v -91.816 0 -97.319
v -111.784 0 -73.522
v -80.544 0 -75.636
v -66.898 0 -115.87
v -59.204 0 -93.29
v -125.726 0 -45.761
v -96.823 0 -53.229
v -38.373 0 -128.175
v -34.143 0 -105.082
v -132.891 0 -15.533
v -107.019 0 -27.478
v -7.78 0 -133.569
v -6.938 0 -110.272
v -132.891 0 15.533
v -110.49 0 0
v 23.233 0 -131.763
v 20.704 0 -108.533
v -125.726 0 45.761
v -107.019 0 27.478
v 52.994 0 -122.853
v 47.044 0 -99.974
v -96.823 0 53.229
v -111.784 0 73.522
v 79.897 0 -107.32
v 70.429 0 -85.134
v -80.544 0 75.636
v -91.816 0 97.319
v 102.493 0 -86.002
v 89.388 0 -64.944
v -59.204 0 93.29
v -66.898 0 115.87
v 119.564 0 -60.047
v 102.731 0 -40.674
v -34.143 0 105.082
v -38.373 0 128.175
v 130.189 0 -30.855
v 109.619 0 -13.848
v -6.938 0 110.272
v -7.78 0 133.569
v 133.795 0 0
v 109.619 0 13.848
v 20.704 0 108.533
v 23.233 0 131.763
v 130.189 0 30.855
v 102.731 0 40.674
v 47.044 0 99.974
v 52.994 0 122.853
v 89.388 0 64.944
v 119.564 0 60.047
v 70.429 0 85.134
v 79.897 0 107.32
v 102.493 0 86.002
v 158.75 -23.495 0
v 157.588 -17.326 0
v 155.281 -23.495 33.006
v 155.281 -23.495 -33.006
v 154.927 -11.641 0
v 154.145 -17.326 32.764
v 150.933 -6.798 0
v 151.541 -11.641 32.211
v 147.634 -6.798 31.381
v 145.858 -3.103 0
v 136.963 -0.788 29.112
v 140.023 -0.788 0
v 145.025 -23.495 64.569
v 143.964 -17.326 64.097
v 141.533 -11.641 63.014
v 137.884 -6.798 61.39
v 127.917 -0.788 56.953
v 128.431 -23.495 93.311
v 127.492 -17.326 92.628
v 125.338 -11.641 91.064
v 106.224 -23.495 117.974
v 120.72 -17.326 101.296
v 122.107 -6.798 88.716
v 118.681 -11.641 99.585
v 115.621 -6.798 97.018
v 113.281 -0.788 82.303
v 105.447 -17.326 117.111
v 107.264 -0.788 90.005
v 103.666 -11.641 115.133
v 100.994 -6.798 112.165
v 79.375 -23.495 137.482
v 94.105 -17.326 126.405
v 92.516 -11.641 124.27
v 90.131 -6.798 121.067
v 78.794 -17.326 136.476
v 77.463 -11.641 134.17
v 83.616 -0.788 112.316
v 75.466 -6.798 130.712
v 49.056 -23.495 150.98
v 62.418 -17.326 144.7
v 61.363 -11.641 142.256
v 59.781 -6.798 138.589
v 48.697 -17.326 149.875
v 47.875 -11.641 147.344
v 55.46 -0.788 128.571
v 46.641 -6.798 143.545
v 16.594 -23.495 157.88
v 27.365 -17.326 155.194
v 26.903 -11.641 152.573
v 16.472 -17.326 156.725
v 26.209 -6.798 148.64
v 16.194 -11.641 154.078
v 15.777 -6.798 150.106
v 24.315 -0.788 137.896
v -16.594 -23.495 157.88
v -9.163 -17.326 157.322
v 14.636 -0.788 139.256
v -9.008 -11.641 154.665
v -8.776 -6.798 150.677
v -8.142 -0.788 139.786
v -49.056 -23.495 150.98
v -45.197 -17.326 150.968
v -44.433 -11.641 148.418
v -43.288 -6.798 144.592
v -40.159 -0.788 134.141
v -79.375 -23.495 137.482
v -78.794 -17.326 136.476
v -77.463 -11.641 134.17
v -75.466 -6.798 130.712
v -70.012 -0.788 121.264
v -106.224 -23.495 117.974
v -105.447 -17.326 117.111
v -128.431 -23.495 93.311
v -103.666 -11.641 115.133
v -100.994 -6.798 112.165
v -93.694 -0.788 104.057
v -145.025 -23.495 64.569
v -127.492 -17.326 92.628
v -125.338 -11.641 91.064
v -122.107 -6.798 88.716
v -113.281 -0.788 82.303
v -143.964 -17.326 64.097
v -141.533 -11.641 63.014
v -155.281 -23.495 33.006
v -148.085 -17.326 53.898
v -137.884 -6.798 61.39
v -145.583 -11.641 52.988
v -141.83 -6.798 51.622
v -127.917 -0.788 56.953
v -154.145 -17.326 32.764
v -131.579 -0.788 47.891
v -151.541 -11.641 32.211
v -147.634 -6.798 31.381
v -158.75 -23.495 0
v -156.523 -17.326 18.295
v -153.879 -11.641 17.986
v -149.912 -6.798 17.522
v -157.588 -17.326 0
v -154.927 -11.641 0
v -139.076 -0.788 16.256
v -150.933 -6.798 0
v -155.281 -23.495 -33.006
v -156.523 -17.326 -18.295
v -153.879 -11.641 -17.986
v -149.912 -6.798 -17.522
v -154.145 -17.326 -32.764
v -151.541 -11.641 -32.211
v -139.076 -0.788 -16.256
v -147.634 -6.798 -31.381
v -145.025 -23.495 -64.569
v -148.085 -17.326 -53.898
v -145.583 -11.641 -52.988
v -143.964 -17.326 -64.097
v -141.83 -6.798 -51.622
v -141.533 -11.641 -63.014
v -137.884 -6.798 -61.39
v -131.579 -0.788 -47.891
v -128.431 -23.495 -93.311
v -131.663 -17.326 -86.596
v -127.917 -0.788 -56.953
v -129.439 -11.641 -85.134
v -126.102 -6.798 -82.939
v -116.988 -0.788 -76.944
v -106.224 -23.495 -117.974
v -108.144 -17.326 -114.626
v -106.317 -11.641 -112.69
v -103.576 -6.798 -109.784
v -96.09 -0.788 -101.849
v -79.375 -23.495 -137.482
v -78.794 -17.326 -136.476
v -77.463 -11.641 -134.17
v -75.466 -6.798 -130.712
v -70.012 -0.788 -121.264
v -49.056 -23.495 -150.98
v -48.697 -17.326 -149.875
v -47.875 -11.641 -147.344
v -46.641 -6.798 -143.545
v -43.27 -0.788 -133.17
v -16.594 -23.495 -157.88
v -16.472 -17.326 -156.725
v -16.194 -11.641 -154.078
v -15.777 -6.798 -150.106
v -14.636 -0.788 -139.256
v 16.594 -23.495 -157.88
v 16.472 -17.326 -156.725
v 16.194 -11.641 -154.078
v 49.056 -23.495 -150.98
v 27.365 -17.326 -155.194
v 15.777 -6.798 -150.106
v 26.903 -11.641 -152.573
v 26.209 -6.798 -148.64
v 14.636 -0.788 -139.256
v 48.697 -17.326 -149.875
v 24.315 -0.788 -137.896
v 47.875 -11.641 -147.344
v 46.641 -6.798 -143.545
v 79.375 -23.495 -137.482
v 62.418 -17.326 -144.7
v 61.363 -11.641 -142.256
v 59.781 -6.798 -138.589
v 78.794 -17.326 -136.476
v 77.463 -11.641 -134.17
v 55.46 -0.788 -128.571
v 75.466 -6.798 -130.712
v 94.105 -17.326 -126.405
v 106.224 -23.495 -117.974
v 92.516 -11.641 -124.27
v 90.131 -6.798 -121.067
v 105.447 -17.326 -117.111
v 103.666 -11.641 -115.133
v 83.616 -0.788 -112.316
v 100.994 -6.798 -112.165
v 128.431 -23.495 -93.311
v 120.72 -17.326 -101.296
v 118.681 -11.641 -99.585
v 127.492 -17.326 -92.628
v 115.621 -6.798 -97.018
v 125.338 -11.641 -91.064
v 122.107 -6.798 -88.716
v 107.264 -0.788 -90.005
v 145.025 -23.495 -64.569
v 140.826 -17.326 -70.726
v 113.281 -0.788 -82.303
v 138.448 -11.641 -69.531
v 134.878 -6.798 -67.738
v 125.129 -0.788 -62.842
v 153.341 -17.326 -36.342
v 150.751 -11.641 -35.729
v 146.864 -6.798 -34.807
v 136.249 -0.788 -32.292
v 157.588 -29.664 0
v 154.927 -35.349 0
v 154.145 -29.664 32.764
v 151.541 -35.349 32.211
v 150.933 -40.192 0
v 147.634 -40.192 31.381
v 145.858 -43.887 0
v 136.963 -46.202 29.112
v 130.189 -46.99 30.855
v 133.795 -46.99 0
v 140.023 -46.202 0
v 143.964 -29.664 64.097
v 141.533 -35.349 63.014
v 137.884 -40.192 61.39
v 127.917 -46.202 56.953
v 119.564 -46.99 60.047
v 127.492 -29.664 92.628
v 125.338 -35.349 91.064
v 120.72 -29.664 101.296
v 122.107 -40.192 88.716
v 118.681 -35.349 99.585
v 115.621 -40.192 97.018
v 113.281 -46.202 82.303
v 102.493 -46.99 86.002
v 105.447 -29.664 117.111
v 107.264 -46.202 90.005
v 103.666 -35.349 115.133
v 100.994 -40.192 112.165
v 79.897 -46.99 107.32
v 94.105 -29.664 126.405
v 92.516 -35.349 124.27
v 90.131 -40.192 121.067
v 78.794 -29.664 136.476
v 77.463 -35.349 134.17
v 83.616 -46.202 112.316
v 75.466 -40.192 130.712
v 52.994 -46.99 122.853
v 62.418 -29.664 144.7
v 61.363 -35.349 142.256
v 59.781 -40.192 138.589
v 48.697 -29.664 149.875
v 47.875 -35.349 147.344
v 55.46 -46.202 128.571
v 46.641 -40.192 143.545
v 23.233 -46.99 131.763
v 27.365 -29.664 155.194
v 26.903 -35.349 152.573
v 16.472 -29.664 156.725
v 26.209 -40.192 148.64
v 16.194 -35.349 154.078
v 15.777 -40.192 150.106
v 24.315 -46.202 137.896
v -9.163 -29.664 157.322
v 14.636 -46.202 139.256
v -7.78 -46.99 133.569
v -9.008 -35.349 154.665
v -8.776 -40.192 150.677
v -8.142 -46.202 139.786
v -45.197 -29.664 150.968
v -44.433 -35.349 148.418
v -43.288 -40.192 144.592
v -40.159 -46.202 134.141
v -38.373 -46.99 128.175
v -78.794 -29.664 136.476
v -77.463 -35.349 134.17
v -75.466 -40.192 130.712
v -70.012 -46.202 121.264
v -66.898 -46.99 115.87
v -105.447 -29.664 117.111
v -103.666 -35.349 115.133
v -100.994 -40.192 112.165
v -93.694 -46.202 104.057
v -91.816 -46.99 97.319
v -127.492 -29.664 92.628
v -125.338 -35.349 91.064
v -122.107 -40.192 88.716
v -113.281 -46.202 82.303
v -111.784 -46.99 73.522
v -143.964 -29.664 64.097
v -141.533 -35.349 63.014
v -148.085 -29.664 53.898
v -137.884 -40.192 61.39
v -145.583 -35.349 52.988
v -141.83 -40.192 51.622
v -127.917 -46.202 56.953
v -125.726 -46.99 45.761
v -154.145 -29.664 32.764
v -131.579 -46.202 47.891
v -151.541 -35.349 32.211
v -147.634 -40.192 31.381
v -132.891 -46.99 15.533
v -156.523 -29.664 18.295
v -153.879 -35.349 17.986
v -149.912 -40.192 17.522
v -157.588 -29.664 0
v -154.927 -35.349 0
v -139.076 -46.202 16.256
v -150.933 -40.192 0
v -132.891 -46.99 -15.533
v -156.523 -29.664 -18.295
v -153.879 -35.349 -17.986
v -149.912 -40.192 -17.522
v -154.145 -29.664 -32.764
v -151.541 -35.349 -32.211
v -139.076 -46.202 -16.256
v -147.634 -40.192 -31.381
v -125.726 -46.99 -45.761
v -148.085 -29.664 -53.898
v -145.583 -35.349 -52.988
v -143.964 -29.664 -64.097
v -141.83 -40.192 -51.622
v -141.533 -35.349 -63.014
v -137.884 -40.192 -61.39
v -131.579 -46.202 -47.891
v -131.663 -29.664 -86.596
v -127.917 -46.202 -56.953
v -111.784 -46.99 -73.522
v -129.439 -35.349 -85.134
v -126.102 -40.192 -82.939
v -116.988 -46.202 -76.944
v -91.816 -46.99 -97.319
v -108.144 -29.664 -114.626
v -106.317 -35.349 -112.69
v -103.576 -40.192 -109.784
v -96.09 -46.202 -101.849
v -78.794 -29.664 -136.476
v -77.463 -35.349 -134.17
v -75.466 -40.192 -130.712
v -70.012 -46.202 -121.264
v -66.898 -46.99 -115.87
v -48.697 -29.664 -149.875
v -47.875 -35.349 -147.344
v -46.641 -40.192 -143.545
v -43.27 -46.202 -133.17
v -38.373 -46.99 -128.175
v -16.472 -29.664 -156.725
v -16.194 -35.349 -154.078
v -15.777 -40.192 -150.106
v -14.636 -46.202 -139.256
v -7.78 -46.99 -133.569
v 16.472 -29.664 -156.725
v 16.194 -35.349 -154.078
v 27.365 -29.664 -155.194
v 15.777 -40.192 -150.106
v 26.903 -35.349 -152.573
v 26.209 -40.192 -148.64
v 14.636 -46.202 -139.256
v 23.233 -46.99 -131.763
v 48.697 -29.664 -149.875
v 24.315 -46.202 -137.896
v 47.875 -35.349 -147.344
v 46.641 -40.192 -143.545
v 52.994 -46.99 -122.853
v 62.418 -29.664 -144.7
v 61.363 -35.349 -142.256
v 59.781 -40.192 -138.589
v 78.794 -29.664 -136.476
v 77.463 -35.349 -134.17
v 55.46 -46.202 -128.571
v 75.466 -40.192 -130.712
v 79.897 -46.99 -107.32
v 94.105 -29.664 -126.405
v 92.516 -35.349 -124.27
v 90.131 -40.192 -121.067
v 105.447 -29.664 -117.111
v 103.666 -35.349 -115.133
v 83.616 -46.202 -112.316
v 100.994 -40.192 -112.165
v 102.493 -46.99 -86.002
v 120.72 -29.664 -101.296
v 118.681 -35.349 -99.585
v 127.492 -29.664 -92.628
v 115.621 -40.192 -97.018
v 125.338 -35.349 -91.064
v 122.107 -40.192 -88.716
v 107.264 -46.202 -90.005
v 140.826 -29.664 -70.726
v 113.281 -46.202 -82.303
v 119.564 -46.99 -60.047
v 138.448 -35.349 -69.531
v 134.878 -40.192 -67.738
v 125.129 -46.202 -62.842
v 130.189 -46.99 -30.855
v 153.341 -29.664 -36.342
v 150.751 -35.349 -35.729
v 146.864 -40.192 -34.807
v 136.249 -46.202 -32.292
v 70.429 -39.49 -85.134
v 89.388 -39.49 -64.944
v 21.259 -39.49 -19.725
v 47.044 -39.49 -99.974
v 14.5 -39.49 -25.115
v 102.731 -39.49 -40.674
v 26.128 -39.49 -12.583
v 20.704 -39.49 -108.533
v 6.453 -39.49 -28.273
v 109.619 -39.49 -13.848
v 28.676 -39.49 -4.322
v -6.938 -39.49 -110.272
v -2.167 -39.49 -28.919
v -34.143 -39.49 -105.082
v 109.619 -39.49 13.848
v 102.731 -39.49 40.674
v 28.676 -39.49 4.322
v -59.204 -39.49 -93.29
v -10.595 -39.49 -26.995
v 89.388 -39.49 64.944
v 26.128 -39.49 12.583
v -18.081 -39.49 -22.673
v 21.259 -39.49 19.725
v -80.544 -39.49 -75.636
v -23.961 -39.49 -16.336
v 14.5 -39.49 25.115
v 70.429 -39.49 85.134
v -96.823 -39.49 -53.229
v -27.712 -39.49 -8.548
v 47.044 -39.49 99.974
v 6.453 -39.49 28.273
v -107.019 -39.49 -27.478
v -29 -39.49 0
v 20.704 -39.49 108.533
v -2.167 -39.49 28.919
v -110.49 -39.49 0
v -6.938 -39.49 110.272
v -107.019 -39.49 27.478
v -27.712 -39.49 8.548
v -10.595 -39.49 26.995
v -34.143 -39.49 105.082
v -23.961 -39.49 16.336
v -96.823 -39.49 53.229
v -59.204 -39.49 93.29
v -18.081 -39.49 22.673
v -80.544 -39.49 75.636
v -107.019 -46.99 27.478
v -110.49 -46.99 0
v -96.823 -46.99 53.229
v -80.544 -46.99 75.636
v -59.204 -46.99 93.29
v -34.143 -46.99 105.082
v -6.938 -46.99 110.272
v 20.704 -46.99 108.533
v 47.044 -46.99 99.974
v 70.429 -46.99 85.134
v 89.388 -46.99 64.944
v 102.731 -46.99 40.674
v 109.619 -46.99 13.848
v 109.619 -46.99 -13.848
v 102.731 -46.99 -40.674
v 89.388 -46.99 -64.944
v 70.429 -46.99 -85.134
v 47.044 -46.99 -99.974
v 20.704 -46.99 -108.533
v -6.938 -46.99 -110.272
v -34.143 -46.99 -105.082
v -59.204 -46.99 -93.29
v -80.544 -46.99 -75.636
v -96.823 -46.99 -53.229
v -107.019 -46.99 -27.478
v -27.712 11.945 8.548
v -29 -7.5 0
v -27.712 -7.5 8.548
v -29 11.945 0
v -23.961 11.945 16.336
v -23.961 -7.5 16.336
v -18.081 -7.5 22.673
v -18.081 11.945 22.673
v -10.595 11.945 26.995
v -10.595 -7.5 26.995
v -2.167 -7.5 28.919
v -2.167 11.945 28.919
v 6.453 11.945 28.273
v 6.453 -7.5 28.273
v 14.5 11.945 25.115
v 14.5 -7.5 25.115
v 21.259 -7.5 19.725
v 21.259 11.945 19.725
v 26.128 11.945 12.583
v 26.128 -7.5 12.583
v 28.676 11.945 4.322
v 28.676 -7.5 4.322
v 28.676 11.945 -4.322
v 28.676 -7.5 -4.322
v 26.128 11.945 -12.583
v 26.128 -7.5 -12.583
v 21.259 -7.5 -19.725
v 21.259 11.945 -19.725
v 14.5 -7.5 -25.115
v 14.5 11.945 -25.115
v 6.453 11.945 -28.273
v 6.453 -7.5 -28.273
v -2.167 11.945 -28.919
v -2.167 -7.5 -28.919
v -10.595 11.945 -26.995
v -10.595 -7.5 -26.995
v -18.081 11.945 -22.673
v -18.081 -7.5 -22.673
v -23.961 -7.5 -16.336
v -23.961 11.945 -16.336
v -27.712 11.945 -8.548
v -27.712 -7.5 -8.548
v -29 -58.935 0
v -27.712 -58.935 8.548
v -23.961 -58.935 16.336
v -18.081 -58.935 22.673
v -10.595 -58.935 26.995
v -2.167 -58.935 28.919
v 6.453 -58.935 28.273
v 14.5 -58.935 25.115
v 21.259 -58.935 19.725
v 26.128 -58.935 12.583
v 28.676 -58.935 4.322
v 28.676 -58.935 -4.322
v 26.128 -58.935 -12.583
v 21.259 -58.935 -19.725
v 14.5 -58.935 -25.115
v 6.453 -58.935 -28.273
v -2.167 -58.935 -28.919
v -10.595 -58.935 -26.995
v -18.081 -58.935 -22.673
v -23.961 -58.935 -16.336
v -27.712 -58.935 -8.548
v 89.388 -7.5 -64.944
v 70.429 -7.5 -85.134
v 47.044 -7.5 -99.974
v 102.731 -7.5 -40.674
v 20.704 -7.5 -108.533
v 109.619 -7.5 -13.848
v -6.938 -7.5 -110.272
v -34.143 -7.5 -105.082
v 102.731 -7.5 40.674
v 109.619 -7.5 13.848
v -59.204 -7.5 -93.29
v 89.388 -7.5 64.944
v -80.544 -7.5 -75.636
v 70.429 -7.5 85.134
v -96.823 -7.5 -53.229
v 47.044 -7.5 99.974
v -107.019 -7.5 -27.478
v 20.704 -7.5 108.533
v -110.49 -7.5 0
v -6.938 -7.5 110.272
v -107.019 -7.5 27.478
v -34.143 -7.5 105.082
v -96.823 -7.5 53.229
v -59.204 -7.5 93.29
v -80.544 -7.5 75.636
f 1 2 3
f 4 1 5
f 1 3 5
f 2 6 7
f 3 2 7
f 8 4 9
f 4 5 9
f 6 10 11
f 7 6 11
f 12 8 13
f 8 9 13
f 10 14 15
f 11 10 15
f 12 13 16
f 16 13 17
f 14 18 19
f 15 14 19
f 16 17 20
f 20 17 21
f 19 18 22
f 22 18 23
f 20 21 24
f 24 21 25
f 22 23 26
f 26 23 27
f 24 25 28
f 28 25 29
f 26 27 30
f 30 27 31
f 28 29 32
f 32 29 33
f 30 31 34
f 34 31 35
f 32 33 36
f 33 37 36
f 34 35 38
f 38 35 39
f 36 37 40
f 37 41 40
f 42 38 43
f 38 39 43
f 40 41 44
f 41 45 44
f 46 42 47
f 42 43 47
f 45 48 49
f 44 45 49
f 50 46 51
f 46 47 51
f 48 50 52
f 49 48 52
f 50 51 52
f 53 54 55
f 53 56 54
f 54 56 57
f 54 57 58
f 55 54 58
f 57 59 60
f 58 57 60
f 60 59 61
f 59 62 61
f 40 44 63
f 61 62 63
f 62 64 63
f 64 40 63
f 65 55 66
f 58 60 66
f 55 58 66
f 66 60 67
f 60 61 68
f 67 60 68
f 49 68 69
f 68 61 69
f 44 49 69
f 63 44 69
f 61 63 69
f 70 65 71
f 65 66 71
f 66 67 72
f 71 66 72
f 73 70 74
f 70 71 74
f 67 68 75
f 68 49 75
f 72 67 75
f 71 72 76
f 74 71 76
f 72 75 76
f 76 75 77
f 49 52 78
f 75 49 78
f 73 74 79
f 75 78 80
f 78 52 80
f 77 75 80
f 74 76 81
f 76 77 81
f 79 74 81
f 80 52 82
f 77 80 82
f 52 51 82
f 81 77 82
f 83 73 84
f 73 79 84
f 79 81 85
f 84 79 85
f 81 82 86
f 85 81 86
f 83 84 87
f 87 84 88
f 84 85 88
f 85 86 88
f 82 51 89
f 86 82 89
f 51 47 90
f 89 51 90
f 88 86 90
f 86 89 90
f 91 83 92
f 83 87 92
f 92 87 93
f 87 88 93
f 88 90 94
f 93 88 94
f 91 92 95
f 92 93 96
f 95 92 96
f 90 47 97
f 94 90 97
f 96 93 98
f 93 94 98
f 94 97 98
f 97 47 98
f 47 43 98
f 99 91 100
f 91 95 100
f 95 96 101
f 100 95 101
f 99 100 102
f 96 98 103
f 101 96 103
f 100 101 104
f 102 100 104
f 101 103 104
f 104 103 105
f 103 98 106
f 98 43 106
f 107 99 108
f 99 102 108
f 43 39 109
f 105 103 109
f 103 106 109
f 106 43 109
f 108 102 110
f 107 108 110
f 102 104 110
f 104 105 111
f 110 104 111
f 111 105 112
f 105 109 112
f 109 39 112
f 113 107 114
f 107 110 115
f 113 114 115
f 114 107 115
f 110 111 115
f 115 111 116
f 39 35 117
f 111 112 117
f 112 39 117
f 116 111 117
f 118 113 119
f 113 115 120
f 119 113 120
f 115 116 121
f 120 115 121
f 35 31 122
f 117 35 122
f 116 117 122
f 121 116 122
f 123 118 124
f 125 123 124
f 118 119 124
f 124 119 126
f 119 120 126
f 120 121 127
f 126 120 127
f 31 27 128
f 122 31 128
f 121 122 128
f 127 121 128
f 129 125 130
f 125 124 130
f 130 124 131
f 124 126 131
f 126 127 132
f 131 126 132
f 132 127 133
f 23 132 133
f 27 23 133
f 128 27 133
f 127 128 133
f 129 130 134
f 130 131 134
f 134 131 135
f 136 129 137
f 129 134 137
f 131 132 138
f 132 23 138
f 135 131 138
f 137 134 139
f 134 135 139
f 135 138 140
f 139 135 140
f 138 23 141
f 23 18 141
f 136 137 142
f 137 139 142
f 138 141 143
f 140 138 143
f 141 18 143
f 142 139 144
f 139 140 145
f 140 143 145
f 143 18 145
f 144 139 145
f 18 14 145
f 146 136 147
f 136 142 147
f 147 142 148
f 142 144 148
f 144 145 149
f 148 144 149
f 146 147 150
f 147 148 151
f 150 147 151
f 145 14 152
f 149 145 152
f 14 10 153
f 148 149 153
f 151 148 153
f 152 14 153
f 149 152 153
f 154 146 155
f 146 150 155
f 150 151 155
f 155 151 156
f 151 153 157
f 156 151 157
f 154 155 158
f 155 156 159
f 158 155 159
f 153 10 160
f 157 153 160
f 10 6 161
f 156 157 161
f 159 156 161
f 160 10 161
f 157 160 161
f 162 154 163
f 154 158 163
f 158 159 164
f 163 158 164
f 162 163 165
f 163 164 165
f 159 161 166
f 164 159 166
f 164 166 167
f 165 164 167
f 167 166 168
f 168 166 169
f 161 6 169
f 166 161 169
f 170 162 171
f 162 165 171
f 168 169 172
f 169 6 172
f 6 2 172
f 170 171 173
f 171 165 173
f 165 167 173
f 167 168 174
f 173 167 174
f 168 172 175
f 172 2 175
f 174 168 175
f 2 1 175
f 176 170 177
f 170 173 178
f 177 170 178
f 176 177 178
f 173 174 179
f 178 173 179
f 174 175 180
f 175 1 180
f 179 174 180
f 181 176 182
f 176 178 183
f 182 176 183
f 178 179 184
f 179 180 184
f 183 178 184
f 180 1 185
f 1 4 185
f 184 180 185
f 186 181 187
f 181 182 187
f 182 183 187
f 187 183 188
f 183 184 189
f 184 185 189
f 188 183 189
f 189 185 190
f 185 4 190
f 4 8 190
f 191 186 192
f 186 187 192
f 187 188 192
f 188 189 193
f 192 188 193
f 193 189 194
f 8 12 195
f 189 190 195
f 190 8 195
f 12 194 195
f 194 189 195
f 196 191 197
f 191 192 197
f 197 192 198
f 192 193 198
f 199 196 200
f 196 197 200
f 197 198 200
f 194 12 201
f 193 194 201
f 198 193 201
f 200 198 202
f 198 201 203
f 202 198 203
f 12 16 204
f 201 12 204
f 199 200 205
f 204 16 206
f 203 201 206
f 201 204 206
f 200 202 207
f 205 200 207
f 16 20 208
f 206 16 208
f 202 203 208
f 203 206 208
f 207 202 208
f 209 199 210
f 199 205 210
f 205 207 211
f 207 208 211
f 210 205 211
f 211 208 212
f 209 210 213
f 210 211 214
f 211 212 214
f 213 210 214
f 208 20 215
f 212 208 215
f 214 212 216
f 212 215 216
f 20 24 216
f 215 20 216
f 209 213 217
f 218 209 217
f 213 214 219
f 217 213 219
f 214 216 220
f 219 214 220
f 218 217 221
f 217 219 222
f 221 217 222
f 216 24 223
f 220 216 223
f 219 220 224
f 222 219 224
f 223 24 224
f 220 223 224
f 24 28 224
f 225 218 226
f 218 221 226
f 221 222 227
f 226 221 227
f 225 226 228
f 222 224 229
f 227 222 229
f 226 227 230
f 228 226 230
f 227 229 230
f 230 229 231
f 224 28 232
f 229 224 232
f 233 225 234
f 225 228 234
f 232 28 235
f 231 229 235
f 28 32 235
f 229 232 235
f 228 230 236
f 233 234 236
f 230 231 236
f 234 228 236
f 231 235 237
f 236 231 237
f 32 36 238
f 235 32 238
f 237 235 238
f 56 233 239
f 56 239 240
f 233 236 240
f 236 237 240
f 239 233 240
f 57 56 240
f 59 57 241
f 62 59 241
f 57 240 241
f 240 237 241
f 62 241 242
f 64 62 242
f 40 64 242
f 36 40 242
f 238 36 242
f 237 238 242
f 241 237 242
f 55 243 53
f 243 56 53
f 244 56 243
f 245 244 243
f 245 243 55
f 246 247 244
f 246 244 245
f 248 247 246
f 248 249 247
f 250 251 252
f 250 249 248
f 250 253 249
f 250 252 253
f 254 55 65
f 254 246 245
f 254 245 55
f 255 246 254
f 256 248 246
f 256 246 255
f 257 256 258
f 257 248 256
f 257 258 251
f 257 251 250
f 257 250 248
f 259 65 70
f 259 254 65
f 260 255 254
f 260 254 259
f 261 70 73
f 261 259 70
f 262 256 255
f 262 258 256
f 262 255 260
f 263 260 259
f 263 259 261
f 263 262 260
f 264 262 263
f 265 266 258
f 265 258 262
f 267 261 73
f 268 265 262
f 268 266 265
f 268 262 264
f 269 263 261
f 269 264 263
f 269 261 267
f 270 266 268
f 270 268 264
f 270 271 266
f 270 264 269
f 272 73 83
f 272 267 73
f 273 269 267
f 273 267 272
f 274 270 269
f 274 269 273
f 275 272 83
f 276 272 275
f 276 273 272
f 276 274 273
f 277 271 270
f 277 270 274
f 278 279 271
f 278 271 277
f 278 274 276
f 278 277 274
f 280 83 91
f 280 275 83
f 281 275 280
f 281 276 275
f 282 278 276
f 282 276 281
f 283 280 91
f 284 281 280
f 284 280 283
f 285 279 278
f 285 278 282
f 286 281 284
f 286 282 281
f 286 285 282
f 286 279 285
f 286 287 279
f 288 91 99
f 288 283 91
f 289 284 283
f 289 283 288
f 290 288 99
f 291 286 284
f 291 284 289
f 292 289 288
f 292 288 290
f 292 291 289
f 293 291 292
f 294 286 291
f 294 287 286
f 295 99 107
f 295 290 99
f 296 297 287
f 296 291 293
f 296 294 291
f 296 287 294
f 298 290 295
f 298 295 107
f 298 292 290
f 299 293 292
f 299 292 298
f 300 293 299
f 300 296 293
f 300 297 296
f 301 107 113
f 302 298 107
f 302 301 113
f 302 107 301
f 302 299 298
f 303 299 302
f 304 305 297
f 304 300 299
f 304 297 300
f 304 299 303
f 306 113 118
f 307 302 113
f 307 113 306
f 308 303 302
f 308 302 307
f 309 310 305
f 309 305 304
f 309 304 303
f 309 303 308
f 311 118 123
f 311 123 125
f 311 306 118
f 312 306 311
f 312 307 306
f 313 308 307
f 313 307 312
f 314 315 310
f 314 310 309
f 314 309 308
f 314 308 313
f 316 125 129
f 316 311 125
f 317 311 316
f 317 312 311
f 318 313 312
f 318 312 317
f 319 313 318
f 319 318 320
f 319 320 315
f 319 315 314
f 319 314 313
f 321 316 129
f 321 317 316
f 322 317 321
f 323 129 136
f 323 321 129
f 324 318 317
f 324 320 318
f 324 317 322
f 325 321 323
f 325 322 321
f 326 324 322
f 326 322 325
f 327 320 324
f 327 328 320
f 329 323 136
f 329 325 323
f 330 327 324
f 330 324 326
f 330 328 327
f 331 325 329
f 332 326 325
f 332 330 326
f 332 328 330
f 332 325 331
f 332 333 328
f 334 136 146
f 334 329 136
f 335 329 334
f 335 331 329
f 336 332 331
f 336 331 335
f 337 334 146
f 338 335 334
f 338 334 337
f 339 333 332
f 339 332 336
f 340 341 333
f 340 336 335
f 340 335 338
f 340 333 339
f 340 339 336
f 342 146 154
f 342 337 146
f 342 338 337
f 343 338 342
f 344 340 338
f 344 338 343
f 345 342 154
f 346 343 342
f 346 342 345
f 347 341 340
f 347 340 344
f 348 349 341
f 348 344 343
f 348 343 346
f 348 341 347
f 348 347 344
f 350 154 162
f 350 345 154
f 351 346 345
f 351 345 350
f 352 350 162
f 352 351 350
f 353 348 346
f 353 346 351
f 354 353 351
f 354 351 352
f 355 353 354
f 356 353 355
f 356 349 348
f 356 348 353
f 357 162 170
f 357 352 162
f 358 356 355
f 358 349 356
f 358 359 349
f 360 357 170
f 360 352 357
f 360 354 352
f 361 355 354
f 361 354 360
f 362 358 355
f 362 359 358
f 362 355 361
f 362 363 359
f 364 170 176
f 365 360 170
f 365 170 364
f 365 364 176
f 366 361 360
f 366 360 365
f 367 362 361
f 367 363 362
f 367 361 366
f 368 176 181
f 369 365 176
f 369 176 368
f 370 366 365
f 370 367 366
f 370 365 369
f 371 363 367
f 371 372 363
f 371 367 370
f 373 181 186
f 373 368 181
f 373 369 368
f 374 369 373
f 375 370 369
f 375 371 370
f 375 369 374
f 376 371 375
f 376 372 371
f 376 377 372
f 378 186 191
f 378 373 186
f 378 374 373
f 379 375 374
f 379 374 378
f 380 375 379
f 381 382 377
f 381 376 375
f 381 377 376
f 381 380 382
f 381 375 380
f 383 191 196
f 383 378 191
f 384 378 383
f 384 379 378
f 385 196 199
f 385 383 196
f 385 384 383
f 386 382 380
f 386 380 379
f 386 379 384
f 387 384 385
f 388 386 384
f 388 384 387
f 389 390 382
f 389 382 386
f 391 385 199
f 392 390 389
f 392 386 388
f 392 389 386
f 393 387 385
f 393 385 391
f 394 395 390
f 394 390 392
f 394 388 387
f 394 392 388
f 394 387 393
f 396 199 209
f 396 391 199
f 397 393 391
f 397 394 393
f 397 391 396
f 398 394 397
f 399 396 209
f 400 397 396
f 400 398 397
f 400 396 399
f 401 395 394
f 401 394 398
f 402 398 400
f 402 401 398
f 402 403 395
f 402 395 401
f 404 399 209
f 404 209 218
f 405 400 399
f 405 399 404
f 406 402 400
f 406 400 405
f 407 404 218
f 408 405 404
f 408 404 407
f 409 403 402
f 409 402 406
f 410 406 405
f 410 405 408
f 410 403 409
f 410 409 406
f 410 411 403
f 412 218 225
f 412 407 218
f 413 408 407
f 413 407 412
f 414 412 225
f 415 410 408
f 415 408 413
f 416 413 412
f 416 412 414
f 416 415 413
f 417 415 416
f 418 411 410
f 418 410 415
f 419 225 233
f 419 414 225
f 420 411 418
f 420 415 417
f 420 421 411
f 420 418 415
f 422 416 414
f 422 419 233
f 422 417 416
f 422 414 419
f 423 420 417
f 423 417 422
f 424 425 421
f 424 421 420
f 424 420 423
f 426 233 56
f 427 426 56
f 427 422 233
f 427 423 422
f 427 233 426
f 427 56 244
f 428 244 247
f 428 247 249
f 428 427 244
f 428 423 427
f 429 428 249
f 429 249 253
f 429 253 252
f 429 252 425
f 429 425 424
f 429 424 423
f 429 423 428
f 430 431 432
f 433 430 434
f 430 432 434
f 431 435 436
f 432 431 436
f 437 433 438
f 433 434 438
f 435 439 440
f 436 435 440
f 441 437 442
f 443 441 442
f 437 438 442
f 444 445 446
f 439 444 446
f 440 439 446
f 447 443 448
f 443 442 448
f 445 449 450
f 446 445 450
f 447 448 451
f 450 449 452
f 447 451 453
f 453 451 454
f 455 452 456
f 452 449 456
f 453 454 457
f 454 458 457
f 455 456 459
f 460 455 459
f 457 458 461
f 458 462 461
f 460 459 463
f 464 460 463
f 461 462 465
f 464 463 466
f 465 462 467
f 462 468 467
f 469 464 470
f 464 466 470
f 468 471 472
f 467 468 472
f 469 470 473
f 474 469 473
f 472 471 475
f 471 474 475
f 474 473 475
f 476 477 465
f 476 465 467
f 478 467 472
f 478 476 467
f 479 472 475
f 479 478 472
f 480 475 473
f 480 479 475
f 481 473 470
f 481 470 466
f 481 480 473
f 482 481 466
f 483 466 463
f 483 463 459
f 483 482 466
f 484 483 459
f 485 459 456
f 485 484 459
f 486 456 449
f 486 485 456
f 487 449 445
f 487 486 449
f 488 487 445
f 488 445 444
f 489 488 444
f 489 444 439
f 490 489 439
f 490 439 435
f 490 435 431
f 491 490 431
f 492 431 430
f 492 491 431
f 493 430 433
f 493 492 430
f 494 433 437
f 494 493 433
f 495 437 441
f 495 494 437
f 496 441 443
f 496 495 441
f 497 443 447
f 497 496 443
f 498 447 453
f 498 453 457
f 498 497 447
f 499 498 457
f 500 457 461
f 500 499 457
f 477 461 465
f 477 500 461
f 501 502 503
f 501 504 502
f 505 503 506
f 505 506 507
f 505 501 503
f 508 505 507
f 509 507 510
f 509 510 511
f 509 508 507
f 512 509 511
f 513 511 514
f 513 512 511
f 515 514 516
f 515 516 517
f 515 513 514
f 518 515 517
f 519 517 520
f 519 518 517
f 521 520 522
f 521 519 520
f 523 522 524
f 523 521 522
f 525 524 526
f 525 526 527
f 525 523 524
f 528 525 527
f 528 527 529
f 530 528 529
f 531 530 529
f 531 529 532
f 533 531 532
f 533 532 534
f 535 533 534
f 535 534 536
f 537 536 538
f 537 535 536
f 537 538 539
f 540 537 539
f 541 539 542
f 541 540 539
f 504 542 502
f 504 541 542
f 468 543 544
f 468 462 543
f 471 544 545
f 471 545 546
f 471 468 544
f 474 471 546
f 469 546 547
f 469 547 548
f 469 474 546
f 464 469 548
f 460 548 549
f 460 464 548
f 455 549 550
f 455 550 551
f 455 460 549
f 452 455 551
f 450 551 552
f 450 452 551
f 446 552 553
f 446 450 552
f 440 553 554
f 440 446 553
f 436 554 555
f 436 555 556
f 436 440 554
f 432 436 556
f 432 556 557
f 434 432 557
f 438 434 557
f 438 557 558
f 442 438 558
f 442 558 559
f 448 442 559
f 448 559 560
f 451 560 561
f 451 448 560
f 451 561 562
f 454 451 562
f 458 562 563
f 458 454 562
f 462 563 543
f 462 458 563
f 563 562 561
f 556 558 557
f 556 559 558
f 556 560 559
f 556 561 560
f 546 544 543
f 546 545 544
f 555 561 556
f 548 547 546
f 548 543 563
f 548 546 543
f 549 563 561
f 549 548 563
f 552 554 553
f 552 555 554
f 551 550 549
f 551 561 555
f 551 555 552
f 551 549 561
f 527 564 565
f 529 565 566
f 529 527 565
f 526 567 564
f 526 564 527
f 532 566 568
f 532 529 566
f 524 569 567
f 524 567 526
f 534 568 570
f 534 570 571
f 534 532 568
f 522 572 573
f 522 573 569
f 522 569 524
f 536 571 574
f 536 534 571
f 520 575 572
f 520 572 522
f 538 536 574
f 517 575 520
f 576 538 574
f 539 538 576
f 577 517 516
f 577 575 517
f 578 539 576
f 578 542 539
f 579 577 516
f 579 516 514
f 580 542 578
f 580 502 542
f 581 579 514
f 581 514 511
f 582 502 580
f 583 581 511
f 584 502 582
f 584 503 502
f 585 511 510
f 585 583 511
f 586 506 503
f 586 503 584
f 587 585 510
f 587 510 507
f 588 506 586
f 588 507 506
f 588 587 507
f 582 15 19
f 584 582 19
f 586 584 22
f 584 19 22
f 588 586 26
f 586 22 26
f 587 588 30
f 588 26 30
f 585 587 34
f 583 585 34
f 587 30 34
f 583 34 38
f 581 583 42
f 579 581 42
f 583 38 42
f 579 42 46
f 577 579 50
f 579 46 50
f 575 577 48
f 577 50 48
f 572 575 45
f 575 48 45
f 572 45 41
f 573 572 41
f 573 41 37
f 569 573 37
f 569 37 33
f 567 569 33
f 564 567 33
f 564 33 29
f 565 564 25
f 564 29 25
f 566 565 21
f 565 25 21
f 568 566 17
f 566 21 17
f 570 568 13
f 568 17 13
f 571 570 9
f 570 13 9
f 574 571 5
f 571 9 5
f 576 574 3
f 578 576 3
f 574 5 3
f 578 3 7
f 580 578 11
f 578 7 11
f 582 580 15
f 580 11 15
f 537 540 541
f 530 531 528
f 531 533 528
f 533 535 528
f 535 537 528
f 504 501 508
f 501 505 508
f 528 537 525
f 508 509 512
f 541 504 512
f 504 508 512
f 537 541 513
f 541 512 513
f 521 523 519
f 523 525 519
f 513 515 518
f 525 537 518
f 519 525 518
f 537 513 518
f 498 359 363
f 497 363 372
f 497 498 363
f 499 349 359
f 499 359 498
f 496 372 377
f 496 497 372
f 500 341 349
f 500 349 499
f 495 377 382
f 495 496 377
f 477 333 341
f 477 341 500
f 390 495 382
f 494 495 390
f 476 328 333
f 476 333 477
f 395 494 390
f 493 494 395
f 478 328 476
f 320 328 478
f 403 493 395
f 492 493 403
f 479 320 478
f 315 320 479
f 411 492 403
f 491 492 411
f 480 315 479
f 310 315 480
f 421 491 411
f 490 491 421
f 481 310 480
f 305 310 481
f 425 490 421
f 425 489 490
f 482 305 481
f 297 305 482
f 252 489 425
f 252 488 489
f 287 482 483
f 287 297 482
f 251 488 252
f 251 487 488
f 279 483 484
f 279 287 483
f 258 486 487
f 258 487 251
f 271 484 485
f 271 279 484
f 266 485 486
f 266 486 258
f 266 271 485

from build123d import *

# Parameters (mm, degrees)
F0_R     = 158.75
F1_DEPTH = 23.495
F3_R     = 110.49
F3_R_2   = 29
F4_DEPTH = 7.5
F5_DEPTH = 11.945


# Not quite as in the source:
# - a fillet or chamfer that OpenCascade refuses, or shapes differently, is made with other operations: its cross-section is extruded or revolved along the edge and cut away or added


with BuildPart() as f1:
    # F0 (on Front) → F1 (new body)
    with BuildSketch(Plane.XZ):
        Circle(F0_R)
    extrude(amount=F1_DEPTH)

    # F2: fillet of radius 25 on 1 edges, made by hand

    # F2_s1 → F2_t2 (revolve, cut)
    with BuildSketch(Plane.XY):
        with BuildLine():
            ThreePointArc((158.75, -23.495), (150.9326547089, -6.7980083507), (133.7953416172, 0))
            Line((133.7953416172, 0), (158.75, 0))
            Line((158.75, 0), (158.75, -23.495))
        make_face()
    revolve(axis=Axis((0, 0, 0), (0, -1, 0)), mode=Mode.SUBTRACT)

    # F3 (on face) → F4 (cut)
    with BuildSketch(Plane(origin=(0, 0, 0), x_dir=(-1, 0, 0), z_dir=(0, 1, 0))):
        Circle(F3_R)
        Circle(F3_R_2, mode=Mode.SUBTRACT)
    extrude(amount=-F4_DEPTH, mode=Mode.SUBTRACT)

    # F5 (add): a face of the model
    f5_faces = [f1.faces().sort_by_distance(p)[0] for p in [
        (0, 0, 0),
    ]]
    extrude(f5_faces, amount=F5_DEPTH)

    # F6: F1 across face


with BuildPart() as f1_1:
    add(f1.part)
    add(f1.part.mirror(Plane.XZ.offset(23.495)))


solid = f1_1.part
